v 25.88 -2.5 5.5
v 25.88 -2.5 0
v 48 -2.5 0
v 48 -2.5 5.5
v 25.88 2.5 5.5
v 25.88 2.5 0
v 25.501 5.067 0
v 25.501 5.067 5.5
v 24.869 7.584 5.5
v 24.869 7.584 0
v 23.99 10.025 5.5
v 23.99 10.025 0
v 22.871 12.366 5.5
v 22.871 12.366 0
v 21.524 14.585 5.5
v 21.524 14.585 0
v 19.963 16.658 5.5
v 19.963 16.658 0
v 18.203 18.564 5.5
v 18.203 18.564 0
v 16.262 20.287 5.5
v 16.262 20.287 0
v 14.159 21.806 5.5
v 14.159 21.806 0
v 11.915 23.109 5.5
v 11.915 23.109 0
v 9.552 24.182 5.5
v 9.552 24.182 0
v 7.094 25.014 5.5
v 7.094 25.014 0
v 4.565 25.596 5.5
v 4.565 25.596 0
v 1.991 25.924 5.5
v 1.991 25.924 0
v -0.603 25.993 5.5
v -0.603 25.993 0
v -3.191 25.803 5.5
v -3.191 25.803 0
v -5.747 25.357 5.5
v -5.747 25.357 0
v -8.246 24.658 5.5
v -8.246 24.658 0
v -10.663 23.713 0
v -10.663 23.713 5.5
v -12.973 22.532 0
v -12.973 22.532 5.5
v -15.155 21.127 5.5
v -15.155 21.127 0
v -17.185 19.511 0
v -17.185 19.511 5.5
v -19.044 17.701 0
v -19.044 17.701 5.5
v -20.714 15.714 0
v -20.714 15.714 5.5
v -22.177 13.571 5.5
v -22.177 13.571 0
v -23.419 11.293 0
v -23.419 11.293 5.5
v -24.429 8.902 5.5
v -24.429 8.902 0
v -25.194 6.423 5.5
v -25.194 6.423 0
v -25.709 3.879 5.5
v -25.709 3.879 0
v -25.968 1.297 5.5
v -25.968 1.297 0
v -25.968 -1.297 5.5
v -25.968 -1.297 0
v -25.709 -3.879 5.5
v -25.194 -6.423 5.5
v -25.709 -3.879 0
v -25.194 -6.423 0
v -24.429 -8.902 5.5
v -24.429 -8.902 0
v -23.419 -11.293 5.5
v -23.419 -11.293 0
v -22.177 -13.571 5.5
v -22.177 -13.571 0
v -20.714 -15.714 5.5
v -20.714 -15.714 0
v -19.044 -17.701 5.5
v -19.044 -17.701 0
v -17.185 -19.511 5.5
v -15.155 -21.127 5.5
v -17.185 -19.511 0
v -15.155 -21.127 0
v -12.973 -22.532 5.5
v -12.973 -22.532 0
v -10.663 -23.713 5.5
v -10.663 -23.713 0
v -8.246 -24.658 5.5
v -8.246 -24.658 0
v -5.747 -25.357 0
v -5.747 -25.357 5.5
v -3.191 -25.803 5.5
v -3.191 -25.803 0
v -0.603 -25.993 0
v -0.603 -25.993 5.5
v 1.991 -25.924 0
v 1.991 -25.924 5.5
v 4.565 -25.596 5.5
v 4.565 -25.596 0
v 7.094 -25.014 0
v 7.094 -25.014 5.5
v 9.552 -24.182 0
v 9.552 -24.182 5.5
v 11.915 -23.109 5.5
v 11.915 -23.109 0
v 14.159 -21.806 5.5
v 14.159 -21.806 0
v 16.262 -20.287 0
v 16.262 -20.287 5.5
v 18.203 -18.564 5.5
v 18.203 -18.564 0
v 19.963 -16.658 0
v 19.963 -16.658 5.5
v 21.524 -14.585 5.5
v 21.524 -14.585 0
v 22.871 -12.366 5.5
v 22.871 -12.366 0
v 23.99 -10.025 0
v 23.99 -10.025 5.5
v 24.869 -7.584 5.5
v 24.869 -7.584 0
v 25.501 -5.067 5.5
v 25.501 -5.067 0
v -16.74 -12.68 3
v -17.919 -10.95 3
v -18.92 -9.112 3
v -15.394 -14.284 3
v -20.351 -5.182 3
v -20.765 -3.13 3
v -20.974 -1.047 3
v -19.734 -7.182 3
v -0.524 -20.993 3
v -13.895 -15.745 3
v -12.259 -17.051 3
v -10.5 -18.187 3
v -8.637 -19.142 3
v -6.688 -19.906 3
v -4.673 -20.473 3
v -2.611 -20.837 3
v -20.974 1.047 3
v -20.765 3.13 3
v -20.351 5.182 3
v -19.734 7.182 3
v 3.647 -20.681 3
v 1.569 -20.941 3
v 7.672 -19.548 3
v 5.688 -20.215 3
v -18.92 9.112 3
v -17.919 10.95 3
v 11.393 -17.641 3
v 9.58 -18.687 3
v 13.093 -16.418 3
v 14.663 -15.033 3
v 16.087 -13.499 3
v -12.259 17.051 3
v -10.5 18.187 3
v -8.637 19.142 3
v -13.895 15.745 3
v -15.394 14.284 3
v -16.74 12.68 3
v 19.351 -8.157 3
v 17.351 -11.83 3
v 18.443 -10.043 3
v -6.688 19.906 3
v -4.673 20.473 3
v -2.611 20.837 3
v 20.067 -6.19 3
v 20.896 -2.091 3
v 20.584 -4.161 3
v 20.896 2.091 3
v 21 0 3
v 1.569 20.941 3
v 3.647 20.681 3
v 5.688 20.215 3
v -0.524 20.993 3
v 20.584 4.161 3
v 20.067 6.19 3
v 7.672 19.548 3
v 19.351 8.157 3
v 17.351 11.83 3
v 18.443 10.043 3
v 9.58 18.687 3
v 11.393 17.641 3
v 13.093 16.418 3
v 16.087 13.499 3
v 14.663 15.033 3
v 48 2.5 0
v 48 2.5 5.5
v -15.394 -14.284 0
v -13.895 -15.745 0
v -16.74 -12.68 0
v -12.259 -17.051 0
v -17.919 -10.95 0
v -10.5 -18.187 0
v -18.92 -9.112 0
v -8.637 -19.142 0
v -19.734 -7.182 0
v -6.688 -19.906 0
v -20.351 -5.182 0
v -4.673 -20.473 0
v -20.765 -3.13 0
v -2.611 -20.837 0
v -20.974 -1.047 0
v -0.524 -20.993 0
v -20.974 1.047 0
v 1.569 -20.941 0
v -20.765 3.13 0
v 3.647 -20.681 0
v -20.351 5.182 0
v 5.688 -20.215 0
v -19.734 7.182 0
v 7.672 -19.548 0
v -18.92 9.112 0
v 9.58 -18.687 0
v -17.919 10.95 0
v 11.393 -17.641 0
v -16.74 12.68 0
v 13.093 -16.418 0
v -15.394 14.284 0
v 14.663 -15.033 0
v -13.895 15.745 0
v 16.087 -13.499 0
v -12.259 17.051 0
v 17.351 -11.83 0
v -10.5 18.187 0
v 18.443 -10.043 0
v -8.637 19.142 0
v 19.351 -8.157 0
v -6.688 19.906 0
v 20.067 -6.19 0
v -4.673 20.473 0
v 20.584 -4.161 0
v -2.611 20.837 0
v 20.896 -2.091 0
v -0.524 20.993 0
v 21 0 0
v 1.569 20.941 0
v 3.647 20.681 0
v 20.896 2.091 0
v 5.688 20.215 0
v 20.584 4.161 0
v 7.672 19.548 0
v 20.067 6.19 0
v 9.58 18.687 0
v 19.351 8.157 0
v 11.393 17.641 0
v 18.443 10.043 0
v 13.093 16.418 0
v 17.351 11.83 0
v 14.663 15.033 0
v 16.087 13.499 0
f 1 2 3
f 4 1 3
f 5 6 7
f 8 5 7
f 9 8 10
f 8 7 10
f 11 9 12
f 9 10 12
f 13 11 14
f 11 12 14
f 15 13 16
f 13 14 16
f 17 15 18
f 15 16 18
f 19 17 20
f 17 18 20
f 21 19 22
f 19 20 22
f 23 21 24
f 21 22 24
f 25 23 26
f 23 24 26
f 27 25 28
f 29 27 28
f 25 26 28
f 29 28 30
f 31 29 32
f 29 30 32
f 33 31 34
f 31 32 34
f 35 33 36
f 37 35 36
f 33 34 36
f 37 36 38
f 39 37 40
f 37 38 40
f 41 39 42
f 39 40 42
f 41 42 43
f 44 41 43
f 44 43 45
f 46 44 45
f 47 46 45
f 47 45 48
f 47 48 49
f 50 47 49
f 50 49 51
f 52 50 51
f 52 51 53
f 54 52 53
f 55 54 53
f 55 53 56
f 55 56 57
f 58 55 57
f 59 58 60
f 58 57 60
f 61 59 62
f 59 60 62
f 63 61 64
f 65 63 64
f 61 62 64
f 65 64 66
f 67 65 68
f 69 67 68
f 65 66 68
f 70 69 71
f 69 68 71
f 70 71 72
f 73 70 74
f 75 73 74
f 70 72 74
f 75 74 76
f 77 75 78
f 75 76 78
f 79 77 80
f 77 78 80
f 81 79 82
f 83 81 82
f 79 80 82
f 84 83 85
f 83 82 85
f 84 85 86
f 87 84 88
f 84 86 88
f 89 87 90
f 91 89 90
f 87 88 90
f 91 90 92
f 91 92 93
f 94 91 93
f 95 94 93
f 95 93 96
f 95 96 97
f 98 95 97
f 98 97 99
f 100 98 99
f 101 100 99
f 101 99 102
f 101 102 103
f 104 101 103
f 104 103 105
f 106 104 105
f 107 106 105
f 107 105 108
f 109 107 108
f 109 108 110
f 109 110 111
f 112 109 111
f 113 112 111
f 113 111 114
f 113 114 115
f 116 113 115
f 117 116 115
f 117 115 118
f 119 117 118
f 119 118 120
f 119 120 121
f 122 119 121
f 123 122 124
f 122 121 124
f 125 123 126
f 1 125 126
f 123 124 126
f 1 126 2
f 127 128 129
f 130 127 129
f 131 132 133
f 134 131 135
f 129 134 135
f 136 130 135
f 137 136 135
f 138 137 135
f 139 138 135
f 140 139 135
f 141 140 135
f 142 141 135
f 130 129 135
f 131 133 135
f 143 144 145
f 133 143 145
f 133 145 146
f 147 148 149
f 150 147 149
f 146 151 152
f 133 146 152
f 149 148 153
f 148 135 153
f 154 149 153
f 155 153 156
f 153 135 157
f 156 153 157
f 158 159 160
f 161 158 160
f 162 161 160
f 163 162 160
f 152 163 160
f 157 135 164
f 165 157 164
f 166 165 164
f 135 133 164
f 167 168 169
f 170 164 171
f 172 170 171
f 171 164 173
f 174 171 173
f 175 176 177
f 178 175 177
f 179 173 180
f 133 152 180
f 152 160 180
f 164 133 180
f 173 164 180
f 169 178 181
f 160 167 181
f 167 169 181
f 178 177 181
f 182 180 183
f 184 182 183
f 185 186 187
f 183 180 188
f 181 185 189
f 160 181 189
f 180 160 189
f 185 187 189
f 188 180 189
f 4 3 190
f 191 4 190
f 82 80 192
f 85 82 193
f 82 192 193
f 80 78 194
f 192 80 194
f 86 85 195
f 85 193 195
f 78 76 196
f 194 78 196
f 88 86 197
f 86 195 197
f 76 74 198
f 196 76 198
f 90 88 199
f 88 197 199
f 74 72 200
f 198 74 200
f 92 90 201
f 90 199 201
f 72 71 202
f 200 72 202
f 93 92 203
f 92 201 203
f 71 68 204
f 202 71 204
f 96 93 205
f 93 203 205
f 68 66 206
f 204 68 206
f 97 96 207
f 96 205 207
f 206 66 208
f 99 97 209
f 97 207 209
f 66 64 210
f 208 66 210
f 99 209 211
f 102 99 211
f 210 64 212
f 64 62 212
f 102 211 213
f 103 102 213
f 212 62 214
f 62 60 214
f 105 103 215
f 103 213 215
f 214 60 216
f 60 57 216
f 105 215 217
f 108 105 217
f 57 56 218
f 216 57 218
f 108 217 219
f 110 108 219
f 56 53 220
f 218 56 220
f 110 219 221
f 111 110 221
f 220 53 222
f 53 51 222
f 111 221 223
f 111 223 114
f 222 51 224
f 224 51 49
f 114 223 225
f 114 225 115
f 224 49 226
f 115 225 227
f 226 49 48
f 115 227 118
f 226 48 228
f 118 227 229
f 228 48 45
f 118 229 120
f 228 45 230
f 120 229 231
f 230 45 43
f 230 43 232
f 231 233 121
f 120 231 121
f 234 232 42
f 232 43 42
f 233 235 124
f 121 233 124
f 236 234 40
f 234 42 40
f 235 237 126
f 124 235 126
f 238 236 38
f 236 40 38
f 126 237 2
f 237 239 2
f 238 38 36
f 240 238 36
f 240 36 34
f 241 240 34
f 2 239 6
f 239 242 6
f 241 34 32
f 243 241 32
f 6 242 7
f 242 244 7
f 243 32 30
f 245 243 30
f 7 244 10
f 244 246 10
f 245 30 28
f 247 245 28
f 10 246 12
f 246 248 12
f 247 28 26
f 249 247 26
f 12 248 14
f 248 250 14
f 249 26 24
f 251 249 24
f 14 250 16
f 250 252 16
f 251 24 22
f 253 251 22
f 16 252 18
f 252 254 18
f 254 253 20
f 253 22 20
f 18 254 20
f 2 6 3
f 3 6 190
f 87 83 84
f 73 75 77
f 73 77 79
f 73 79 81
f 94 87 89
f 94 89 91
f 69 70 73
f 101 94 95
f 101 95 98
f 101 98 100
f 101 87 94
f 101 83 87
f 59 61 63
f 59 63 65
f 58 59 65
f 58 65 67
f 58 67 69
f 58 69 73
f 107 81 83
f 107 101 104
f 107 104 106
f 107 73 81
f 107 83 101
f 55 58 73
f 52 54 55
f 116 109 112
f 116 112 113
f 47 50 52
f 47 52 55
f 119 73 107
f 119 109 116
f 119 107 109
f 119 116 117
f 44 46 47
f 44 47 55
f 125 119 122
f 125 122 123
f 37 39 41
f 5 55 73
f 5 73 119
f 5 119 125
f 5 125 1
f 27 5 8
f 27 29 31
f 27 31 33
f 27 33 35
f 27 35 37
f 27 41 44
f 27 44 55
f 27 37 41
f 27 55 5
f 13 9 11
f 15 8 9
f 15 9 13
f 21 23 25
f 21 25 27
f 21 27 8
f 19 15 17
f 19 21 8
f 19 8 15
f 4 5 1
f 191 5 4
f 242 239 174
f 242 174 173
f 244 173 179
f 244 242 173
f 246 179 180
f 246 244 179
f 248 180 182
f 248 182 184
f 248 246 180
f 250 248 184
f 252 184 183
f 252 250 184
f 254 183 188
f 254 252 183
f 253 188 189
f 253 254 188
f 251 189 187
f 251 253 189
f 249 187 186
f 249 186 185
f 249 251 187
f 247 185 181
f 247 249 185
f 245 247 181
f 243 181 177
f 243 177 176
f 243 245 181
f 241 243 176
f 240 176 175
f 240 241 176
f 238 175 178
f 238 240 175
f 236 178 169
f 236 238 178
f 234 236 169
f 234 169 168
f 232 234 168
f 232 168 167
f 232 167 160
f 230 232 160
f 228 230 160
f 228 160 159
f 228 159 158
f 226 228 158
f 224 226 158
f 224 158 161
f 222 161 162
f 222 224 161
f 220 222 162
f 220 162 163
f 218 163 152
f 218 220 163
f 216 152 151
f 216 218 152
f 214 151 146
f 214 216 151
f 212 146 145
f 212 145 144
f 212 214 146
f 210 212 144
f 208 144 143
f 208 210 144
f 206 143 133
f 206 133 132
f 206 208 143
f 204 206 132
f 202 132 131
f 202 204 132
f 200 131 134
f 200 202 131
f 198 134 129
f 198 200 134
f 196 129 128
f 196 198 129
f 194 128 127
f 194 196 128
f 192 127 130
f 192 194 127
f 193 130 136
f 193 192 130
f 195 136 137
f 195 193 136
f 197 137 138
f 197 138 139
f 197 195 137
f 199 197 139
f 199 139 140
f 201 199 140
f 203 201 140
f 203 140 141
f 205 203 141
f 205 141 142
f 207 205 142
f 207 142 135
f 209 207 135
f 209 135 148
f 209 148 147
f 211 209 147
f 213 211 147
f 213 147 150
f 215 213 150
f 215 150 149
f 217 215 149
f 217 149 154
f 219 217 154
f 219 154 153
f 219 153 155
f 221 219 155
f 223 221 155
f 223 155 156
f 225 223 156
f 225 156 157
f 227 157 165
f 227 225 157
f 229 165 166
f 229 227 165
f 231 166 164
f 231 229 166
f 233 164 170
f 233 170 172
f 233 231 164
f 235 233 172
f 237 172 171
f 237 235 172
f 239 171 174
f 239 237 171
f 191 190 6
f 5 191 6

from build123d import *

# Parameters (mm, degrees)
F0_R     = 21
F1_DEPTH = 5.5
F2_DEPTH = 3


# Not quite as in the source:
# - a feature of the source that left no trace in its solid (it failed there, or was rolled back) is left out


with BuildPart() as f1:
    # F0 (on Top) → F1 (new body)
    with BuildSketch(Plane.XY):
        with BuildLine():
            ThreePointArc((25.8795285892, -2.5), (25.9698646831, -1.2514504945), (26, 0))
            ThreePointArc((26, 0), (25.9698646831, 1.2514504945), (25.8795285892, 2.5))
            ThreePointArc((25.8795285892, 2.5), (-26, 0), (25.8795285892, -2.5))
        make_face()
        Circle(F0_R, mode=Mode.SUBTRACT)
        with BuildLine():
            ThreePointArc((25.8795285892, 2.5), (25.9698646831, 1.2514504945), (26, 0))
            ThreePointArc((26, 0), (25.9698646831, -1.2514504945), (25.8795285892, -2.5))
            Line((25.8795285892, -2.5), (48, -2.5))
            Line((48, -2.5), (48, 0))
            Line((48, 0), (48, 2.5))
            Line((48, 2.5), (25.8795285892, 2.5))
        make_face()
        Circle(F0_R)
    extrude(amount=F1_DEPTH)

    # F0 (on Top) → F2 (cut)
    with BuildSketch(Plane.XY):
        Circle(F0_R)
    extrude(amount=F2_DEPTH, mode=Mode.SUBTRACT)


solid = f1.part
